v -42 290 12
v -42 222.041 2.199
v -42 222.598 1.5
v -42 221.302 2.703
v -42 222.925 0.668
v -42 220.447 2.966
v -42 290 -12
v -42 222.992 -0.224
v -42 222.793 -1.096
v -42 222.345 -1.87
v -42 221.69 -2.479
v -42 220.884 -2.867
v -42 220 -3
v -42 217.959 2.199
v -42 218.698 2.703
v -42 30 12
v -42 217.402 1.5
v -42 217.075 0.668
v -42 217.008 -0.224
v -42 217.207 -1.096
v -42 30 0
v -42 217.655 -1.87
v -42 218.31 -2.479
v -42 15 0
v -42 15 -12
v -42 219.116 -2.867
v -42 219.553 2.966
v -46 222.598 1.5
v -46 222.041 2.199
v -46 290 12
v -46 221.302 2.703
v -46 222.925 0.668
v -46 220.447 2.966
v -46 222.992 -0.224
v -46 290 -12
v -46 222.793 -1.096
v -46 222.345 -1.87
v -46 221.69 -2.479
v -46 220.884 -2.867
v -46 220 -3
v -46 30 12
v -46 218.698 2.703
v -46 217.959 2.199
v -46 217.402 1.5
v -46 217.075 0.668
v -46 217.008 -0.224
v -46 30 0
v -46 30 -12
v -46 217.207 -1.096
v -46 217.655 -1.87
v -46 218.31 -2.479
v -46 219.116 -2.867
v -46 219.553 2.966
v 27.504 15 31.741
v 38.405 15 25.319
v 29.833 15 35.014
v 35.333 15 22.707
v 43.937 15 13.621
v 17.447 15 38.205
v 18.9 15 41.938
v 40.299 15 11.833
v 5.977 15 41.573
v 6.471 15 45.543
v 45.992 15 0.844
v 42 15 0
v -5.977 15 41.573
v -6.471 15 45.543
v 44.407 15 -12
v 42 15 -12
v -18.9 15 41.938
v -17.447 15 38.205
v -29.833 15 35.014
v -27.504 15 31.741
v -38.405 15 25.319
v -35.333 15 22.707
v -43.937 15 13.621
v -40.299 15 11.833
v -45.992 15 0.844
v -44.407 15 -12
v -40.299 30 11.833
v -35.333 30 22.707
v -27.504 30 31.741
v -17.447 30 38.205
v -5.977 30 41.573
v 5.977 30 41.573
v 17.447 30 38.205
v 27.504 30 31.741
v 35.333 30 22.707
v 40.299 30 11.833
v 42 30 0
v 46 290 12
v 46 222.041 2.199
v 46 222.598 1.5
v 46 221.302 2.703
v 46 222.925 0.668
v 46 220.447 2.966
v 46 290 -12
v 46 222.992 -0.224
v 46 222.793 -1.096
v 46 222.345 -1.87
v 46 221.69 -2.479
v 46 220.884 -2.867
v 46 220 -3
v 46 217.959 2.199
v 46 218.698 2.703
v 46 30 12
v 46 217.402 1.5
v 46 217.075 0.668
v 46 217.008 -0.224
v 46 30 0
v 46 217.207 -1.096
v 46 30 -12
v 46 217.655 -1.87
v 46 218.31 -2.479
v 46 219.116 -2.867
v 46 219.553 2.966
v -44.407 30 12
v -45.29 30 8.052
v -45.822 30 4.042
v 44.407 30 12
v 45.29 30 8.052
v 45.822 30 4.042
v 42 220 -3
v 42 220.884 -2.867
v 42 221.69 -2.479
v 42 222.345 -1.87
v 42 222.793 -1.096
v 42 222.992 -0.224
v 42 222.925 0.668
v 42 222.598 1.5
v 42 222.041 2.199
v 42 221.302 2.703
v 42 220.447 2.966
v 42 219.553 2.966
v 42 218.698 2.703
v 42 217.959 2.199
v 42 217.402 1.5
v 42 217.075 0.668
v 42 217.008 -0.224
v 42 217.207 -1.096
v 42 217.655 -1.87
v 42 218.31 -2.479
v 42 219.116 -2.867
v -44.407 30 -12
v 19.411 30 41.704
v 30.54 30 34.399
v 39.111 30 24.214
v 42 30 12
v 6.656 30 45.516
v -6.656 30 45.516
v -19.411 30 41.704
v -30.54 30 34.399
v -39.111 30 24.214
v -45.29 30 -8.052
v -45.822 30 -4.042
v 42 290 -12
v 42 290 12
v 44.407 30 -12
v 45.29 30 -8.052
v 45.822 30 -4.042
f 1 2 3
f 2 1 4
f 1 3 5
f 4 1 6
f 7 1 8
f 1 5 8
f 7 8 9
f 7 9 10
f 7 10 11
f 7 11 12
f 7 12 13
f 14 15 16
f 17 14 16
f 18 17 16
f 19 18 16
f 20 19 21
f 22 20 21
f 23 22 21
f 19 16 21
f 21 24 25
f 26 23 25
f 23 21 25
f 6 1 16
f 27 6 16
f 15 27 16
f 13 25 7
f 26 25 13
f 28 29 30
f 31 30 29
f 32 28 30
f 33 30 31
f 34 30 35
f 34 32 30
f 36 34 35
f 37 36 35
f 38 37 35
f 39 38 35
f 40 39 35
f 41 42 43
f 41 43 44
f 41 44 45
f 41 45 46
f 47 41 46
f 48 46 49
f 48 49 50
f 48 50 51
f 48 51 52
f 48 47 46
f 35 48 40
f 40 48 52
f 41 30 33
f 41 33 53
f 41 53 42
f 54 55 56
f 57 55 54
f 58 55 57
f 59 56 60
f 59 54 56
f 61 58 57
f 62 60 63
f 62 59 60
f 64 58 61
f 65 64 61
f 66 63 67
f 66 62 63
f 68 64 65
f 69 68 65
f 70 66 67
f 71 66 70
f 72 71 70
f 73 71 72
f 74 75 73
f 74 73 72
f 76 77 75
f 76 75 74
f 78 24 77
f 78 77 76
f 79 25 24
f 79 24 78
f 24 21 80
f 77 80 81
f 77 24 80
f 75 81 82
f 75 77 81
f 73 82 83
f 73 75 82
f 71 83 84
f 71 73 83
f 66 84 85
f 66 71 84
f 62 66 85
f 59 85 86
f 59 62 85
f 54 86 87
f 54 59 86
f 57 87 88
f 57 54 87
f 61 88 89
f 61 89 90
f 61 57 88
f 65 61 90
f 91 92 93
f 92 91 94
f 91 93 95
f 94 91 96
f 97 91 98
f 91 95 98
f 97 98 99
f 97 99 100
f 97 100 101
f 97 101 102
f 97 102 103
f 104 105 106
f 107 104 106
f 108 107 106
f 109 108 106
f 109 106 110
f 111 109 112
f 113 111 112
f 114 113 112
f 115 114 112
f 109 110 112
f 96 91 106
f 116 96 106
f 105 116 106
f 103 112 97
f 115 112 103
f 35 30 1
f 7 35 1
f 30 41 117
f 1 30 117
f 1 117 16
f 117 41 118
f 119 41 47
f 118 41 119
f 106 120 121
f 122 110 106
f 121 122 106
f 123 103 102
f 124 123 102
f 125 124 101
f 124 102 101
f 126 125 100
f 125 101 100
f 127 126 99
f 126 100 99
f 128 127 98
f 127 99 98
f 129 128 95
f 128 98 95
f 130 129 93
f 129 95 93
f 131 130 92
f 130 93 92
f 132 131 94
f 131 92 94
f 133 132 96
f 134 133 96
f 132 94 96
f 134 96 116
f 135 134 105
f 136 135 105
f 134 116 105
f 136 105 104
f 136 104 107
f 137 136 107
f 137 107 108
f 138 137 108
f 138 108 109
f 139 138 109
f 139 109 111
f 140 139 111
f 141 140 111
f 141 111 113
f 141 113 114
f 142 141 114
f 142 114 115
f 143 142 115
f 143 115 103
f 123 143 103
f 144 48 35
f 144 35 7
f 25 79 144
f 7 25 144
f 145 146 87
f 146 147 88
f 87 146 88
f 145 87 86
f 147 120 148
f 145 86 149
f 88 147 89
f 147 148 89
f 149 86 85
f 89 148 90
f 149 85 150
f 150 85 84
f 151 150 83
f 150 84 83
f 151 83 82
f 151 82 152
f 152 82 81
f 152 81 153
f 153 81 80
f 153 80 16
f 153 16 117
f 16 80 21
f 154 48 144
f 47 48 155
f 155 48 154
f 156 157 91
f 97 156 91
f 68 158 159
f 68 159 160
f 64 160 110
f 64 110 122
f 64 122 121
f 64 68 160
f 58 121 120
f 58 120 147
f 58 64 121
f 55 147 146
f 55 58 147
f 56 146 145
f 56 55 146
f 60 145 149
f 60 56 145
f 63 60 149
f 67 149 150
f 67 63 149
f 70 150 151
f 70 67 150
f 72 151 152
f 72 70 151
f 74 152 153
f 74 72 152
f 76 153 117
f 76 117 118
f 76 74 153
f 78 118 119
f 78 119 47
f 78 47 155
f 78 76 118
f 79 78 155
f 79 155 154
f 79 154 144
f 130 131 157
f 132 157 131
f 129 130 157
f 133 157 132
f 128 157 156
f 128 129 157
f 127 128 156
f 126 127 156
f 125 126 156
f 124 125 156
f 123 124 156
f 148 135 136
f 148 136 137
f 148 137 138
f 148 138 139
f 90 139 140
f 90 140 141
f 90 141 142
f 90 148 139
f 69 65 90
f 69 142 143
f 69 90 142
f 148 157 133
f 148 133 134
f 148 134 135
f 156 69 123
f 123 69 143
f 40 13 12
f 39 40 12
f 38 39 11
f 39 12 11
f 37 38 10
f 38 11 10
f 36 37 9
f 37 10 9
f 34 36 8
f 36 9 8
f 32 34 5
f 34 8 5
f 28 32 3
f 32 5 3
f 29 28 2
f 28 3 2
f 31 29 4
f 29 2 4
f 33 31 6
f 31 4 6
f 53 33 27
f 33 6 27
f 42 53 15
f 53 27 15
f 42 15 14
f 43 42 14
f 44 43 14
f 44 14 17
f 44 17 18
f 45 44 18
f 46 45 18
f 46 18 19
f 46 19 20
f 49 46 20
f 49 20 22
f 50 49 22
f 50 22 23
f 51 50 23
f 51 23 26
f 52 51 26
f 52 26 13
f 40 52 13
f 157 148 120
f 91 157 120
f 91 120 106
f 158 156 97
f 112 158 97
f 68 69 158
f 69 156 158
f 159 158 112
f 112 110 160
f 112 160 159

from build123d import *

# Parameters (mm, degrees)
EXTRUDE_1_DEPTH     = 30
SKETCH_4_W          = 4
SKETCH_4_H          = 24
EXTRUDE_3_DEPTH     = 260
SKETCH_7_W          = 149.597155604
SKETCH_7_H          = 115.941502163
CUT_EXTRUDE_3_DEPTH = 59
SKETCH_9_R          = 3
CUT_EXTRUDE_5_DEPTH = 93
SKETCH_10_R         = 50
SKETCH_10_R_2       = 46
CUT_EXTRUDE_6_DEPTH = 15


with BuildPart() as part:
    # 草图1 → 凸台-拉伸1 (new body)
    with BuildSketch(Plane(origin=(0, 0, 0), x_dir=(1, 0, 0), z_dir=(0, 1, 0))):
        with BuildLine():
            Line((-46, 0), (-46, 12))
            Line((-46, 12), (-42, 12))
            Line((-42, 12), (-42, 0))
            ThreePointArc((-42, 0), (0, -42), (42, 0))
            Line((42, 0), (42, 12))
            Line((42, 12), (46, 12))
            Line((46, 12), (46, 0))
            ThreePointArc((46, 0), (0, -46), (-46, 0))
        make_face()
    extrude(amount=EXTRUDE_1_DEPTH)

    # 草图4 → 凸台-拉伸3 (add)
    with BuildSketch(Plane(origin=(0, 30, 0), x_dir=(1, 0, 0), z_dir=(0, 1, 0))):
        with Locations((44, 0)):
            Rectangle(SKETCH_4_W, SKETCH_4_H)
        with Locations((-44, 0)):
            Rectangle(SKETCH_4_W, SKETCH_4_H)
    extrude(amount=EXTRUDE_3_DEPTH)

    # 草图7 → 切除-拉伸3 (cut, through all)
    with BuildSketch(Plane(origin=(0, 0, -12), x_dir=(-1, 0, 0), z_dir=(0, 0, -1))):
        with Locations((8.175952602, -42.970751082)):
            Rectangle(SKETCH_7_W, SKETCH_7_H)
    extrude(amount=-CUT_EXTRUDE_3_DEPTH, mode=Mode.SUBTRACT)

    # 草图9 → 切除-拉伸5 (cut, through all)
    with BuildSketch(Plane(origin=(46, 0, 0), x_dir=(0, 0, -1), z_dir=(1, 0, 0))):
        with Locations((0, 220)):
            Circle(SKETCH_9_R)
    extrude(amount=-CUT_EXTRUDE_5_DEPTH, mode=Mode.SUBTRACT)

    # 草图10 → 切除-拉伸6 (cut)
    with BuildSketch(Plane.XZ.offset(-15)):
        Circle(SKETCH_10_R)
        Circle(SKETCH_10_R_2, mode=Mode.SUBTRACT)
    extrude(amount=-CUT_EXTRUDE_6_DEPTH, mode=Mode.SUBTRACT)


solid = part.part
